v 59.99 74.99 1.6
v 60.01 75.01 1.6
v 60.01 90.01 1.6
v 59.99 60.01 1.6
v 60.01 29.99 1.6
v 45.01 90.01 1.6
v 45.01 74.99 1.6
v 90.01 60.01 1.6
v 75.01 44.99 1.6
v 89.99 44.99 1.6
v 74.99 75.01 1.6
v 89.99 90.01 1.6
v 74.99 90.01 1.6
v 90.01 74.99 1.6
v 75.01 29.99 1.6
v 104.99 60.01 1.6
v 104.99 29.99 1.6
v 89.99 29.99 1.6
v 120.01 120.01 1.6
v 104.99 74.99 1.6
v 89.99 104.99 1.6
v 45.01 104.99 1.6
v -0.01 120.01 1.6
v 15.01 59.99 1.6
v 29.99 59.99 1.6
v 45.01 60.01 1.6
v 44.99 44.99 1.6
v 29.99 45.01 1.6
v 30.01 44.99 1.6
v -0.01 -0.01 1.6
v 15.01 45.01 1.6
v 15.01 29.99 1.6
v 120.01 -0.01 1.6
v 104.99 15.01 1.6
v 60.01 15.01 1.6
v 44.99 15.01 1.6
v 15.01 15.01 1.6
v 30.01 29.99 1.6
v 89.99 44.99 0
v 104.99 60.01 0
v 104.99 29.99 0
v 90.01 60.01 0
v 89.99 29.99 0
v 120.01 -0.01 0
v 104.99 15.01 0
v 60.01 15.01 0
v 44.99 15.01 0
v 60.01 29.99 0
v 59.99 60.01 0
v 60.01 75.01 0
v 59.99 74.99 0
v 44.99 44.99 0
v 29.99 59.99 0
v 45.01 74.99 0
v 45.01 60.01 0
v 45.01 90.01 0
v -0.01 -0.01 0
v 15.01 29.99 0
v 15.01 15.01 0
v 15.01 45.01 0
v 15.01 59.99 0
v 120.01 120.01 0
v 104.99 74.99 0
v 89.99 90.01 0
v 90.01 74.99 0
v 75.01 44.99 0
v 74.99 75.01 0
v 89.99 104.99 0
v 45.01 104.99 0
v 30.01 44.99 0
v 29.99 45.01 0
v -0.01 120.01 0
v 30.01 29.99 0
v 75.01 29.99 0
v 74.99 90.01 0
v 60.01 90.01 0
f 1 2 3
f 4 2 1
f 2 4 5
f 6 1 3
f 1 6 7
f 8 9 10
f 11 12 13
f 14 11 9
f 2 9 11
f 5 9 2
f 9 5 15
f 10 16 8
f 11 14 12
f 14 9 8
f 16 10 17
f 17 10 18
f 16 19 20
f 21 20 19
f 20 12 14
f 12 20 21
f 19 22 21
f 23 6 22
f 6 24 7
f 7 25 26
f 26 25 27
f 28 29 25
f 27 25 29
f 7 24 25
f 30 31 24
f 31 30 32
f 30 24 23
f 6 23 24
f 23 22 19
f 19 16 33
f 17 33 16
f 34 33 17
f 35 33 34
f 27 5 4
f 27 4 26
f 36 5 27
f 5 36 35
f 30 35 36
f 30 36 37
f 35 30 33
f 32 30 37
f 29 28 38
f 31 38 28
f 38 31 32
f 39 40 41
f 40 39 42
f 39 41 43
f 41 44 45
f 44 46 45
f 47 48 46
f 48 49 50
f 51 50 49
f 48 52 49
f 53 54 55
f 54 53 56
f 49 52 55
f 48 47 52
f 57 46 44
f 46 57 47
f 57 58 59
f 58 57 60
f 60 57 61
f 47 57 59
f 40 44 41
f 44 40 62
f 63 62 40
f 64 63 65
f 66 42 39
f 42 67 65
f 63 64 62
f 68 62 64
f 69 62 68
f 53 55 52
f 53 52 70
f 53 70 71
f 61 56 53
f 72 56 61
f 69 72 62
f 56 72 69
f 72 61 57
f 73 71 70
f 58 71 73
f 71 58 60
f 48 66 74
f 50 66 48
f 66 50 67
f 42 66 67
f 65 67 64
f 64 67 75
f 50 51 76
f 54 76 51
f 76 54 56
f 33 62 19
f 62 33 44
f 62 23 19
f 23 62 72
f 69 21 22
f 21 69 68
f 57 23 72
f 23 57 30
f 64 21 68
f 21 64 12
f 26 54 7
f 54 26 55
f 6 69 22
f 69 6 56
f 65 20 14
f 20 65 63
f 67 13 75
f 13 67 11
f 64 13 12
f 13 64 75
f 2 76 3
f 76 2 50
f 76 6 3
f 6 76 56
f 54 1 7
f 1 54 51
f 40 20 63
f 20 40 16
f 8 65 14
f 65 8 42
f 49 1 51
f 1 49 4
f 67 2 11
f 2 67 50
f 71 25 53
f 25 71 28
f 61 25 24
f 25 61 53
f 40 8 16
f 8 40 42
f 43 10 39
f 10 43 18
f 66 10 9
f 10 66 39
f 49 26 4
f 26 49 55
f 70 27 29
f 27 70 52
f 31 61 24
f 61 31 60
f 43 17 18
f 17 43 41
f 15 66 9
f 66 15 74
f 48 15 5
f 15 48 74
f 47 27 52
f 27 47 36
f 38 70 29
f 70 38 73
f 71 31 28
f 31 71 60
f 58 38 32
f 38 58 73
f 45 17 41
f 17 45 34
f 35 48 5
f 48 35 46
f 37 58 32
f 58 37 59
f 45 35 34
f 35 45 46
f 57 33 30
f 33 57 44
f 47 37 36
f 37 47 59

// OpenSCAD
// The north camera's roof AprilTag (36h11, id 2) as a 3D print: the BLACK
// cells only, one connected piece, to lay on a white background (2026-11-05).
// Sibling of scope_tag_black_id0.scad; the backing is
// north_roof_tag_white_back.scad.
//
// Same size as the paper tag on the moving south truss (docs/ROOF_STATE_SENSING.md):
// 150 mm including its one module of white quiet zone, so 10 modules of 15 mm,
// and this part -- the 8 x 8 black region -- is 120 mm square. The white
// quiet zone is the background you lay it on: leave at least one module
// (15 mm) of white showing on every side, or the detector cannot find the
// tag's outline.
//
// One piece with no patches: every black cell of id 2 shares an edge with
// the border ring or another black cell (checked 4-connected), so
// corner_patches is empty. Verified by rendering this geometry and decoding
// it as id 2 (scripts/scope_tag_scad_check.py openscad/north_roof_tag_black_id2.scad).
//
// Printing (as for the scope tag):
//   * Black filament that is black in the NEAR INFRARED. Iris North reads
//     this tag in pure IR most of the night, and some black dyes are close to
//     transparent there. Check a test square under the camera at night first.
//   * Matte face: print the visible face down on a textured sheet, or on the
//     bare bed and scuff it lightly.
//   * The pattern is not mirror-symmetric; mirror_for_face_down handles a
//     face-down print.

tag_size  = 150;              // whole tag including the white quiet zone
modules   = 10;               // 8 tag modules + 1 quiet module each side
module_mm = tag_size / modules;   // 15
thickness = 1.6;              // mm
patch     = 1.6;              // corner patch, mm (keep under 2 x 1.32)
mirror_for_face_down = true;  // true when the visible face prints on the bed
eps = 0.01;                   // overlap so touching cells fuse into one solid

// 1 = black, row 0 at the TOP as the tag is seen; tag 36h11 id 2.
bits = [
  [1,1,1,1,1,1,1,1],
  [1,1,0,0,0,1,1,1],
  [1,1,1,0,1,1,1,1],
  [1,0,1,1,0,1,1,1],
  [1,1,1,1,1,1,0,1],
  [1,1,0,1,1,0,1,1],
  [1,0,0,0,1,0,0,1],
  [1,1,1,1,1,1,1,1],
];

// Lattice corners [row, col] (row 0 = top edge) that get a patch: none for id 2.
corner_patches = [];

N = len(bits);

module cell(r, c) {
  // x right, y up; row 0 at the top
  translate([c * module_mm - eps, (N - 1 - r) * module_mm - eps, 0])
    cube([module_mm + 2 * eps, module_mm + 2 * eps, thickness]);
}

module corner_patch(r, c) {
  translate([c * module_mm - patch / 2, (N - r) * module_mm - patch / 2, 0])
    cube([patch, patch, thickness]);
}

module tag_black() {
  union() {
    for (r = [0 : N - 1], c = [0 : N - 1])
      if (bits[r][c] == 1) cell(r, c);
    for (p = corner_patches) corner_patch(p[0], p[1]);
  }
}

if (mirror_for_face_down)
  translate([N * module_mm, 0, 0]) mirror([1, 0, 0]) tag_black();
else
  tag_black();
